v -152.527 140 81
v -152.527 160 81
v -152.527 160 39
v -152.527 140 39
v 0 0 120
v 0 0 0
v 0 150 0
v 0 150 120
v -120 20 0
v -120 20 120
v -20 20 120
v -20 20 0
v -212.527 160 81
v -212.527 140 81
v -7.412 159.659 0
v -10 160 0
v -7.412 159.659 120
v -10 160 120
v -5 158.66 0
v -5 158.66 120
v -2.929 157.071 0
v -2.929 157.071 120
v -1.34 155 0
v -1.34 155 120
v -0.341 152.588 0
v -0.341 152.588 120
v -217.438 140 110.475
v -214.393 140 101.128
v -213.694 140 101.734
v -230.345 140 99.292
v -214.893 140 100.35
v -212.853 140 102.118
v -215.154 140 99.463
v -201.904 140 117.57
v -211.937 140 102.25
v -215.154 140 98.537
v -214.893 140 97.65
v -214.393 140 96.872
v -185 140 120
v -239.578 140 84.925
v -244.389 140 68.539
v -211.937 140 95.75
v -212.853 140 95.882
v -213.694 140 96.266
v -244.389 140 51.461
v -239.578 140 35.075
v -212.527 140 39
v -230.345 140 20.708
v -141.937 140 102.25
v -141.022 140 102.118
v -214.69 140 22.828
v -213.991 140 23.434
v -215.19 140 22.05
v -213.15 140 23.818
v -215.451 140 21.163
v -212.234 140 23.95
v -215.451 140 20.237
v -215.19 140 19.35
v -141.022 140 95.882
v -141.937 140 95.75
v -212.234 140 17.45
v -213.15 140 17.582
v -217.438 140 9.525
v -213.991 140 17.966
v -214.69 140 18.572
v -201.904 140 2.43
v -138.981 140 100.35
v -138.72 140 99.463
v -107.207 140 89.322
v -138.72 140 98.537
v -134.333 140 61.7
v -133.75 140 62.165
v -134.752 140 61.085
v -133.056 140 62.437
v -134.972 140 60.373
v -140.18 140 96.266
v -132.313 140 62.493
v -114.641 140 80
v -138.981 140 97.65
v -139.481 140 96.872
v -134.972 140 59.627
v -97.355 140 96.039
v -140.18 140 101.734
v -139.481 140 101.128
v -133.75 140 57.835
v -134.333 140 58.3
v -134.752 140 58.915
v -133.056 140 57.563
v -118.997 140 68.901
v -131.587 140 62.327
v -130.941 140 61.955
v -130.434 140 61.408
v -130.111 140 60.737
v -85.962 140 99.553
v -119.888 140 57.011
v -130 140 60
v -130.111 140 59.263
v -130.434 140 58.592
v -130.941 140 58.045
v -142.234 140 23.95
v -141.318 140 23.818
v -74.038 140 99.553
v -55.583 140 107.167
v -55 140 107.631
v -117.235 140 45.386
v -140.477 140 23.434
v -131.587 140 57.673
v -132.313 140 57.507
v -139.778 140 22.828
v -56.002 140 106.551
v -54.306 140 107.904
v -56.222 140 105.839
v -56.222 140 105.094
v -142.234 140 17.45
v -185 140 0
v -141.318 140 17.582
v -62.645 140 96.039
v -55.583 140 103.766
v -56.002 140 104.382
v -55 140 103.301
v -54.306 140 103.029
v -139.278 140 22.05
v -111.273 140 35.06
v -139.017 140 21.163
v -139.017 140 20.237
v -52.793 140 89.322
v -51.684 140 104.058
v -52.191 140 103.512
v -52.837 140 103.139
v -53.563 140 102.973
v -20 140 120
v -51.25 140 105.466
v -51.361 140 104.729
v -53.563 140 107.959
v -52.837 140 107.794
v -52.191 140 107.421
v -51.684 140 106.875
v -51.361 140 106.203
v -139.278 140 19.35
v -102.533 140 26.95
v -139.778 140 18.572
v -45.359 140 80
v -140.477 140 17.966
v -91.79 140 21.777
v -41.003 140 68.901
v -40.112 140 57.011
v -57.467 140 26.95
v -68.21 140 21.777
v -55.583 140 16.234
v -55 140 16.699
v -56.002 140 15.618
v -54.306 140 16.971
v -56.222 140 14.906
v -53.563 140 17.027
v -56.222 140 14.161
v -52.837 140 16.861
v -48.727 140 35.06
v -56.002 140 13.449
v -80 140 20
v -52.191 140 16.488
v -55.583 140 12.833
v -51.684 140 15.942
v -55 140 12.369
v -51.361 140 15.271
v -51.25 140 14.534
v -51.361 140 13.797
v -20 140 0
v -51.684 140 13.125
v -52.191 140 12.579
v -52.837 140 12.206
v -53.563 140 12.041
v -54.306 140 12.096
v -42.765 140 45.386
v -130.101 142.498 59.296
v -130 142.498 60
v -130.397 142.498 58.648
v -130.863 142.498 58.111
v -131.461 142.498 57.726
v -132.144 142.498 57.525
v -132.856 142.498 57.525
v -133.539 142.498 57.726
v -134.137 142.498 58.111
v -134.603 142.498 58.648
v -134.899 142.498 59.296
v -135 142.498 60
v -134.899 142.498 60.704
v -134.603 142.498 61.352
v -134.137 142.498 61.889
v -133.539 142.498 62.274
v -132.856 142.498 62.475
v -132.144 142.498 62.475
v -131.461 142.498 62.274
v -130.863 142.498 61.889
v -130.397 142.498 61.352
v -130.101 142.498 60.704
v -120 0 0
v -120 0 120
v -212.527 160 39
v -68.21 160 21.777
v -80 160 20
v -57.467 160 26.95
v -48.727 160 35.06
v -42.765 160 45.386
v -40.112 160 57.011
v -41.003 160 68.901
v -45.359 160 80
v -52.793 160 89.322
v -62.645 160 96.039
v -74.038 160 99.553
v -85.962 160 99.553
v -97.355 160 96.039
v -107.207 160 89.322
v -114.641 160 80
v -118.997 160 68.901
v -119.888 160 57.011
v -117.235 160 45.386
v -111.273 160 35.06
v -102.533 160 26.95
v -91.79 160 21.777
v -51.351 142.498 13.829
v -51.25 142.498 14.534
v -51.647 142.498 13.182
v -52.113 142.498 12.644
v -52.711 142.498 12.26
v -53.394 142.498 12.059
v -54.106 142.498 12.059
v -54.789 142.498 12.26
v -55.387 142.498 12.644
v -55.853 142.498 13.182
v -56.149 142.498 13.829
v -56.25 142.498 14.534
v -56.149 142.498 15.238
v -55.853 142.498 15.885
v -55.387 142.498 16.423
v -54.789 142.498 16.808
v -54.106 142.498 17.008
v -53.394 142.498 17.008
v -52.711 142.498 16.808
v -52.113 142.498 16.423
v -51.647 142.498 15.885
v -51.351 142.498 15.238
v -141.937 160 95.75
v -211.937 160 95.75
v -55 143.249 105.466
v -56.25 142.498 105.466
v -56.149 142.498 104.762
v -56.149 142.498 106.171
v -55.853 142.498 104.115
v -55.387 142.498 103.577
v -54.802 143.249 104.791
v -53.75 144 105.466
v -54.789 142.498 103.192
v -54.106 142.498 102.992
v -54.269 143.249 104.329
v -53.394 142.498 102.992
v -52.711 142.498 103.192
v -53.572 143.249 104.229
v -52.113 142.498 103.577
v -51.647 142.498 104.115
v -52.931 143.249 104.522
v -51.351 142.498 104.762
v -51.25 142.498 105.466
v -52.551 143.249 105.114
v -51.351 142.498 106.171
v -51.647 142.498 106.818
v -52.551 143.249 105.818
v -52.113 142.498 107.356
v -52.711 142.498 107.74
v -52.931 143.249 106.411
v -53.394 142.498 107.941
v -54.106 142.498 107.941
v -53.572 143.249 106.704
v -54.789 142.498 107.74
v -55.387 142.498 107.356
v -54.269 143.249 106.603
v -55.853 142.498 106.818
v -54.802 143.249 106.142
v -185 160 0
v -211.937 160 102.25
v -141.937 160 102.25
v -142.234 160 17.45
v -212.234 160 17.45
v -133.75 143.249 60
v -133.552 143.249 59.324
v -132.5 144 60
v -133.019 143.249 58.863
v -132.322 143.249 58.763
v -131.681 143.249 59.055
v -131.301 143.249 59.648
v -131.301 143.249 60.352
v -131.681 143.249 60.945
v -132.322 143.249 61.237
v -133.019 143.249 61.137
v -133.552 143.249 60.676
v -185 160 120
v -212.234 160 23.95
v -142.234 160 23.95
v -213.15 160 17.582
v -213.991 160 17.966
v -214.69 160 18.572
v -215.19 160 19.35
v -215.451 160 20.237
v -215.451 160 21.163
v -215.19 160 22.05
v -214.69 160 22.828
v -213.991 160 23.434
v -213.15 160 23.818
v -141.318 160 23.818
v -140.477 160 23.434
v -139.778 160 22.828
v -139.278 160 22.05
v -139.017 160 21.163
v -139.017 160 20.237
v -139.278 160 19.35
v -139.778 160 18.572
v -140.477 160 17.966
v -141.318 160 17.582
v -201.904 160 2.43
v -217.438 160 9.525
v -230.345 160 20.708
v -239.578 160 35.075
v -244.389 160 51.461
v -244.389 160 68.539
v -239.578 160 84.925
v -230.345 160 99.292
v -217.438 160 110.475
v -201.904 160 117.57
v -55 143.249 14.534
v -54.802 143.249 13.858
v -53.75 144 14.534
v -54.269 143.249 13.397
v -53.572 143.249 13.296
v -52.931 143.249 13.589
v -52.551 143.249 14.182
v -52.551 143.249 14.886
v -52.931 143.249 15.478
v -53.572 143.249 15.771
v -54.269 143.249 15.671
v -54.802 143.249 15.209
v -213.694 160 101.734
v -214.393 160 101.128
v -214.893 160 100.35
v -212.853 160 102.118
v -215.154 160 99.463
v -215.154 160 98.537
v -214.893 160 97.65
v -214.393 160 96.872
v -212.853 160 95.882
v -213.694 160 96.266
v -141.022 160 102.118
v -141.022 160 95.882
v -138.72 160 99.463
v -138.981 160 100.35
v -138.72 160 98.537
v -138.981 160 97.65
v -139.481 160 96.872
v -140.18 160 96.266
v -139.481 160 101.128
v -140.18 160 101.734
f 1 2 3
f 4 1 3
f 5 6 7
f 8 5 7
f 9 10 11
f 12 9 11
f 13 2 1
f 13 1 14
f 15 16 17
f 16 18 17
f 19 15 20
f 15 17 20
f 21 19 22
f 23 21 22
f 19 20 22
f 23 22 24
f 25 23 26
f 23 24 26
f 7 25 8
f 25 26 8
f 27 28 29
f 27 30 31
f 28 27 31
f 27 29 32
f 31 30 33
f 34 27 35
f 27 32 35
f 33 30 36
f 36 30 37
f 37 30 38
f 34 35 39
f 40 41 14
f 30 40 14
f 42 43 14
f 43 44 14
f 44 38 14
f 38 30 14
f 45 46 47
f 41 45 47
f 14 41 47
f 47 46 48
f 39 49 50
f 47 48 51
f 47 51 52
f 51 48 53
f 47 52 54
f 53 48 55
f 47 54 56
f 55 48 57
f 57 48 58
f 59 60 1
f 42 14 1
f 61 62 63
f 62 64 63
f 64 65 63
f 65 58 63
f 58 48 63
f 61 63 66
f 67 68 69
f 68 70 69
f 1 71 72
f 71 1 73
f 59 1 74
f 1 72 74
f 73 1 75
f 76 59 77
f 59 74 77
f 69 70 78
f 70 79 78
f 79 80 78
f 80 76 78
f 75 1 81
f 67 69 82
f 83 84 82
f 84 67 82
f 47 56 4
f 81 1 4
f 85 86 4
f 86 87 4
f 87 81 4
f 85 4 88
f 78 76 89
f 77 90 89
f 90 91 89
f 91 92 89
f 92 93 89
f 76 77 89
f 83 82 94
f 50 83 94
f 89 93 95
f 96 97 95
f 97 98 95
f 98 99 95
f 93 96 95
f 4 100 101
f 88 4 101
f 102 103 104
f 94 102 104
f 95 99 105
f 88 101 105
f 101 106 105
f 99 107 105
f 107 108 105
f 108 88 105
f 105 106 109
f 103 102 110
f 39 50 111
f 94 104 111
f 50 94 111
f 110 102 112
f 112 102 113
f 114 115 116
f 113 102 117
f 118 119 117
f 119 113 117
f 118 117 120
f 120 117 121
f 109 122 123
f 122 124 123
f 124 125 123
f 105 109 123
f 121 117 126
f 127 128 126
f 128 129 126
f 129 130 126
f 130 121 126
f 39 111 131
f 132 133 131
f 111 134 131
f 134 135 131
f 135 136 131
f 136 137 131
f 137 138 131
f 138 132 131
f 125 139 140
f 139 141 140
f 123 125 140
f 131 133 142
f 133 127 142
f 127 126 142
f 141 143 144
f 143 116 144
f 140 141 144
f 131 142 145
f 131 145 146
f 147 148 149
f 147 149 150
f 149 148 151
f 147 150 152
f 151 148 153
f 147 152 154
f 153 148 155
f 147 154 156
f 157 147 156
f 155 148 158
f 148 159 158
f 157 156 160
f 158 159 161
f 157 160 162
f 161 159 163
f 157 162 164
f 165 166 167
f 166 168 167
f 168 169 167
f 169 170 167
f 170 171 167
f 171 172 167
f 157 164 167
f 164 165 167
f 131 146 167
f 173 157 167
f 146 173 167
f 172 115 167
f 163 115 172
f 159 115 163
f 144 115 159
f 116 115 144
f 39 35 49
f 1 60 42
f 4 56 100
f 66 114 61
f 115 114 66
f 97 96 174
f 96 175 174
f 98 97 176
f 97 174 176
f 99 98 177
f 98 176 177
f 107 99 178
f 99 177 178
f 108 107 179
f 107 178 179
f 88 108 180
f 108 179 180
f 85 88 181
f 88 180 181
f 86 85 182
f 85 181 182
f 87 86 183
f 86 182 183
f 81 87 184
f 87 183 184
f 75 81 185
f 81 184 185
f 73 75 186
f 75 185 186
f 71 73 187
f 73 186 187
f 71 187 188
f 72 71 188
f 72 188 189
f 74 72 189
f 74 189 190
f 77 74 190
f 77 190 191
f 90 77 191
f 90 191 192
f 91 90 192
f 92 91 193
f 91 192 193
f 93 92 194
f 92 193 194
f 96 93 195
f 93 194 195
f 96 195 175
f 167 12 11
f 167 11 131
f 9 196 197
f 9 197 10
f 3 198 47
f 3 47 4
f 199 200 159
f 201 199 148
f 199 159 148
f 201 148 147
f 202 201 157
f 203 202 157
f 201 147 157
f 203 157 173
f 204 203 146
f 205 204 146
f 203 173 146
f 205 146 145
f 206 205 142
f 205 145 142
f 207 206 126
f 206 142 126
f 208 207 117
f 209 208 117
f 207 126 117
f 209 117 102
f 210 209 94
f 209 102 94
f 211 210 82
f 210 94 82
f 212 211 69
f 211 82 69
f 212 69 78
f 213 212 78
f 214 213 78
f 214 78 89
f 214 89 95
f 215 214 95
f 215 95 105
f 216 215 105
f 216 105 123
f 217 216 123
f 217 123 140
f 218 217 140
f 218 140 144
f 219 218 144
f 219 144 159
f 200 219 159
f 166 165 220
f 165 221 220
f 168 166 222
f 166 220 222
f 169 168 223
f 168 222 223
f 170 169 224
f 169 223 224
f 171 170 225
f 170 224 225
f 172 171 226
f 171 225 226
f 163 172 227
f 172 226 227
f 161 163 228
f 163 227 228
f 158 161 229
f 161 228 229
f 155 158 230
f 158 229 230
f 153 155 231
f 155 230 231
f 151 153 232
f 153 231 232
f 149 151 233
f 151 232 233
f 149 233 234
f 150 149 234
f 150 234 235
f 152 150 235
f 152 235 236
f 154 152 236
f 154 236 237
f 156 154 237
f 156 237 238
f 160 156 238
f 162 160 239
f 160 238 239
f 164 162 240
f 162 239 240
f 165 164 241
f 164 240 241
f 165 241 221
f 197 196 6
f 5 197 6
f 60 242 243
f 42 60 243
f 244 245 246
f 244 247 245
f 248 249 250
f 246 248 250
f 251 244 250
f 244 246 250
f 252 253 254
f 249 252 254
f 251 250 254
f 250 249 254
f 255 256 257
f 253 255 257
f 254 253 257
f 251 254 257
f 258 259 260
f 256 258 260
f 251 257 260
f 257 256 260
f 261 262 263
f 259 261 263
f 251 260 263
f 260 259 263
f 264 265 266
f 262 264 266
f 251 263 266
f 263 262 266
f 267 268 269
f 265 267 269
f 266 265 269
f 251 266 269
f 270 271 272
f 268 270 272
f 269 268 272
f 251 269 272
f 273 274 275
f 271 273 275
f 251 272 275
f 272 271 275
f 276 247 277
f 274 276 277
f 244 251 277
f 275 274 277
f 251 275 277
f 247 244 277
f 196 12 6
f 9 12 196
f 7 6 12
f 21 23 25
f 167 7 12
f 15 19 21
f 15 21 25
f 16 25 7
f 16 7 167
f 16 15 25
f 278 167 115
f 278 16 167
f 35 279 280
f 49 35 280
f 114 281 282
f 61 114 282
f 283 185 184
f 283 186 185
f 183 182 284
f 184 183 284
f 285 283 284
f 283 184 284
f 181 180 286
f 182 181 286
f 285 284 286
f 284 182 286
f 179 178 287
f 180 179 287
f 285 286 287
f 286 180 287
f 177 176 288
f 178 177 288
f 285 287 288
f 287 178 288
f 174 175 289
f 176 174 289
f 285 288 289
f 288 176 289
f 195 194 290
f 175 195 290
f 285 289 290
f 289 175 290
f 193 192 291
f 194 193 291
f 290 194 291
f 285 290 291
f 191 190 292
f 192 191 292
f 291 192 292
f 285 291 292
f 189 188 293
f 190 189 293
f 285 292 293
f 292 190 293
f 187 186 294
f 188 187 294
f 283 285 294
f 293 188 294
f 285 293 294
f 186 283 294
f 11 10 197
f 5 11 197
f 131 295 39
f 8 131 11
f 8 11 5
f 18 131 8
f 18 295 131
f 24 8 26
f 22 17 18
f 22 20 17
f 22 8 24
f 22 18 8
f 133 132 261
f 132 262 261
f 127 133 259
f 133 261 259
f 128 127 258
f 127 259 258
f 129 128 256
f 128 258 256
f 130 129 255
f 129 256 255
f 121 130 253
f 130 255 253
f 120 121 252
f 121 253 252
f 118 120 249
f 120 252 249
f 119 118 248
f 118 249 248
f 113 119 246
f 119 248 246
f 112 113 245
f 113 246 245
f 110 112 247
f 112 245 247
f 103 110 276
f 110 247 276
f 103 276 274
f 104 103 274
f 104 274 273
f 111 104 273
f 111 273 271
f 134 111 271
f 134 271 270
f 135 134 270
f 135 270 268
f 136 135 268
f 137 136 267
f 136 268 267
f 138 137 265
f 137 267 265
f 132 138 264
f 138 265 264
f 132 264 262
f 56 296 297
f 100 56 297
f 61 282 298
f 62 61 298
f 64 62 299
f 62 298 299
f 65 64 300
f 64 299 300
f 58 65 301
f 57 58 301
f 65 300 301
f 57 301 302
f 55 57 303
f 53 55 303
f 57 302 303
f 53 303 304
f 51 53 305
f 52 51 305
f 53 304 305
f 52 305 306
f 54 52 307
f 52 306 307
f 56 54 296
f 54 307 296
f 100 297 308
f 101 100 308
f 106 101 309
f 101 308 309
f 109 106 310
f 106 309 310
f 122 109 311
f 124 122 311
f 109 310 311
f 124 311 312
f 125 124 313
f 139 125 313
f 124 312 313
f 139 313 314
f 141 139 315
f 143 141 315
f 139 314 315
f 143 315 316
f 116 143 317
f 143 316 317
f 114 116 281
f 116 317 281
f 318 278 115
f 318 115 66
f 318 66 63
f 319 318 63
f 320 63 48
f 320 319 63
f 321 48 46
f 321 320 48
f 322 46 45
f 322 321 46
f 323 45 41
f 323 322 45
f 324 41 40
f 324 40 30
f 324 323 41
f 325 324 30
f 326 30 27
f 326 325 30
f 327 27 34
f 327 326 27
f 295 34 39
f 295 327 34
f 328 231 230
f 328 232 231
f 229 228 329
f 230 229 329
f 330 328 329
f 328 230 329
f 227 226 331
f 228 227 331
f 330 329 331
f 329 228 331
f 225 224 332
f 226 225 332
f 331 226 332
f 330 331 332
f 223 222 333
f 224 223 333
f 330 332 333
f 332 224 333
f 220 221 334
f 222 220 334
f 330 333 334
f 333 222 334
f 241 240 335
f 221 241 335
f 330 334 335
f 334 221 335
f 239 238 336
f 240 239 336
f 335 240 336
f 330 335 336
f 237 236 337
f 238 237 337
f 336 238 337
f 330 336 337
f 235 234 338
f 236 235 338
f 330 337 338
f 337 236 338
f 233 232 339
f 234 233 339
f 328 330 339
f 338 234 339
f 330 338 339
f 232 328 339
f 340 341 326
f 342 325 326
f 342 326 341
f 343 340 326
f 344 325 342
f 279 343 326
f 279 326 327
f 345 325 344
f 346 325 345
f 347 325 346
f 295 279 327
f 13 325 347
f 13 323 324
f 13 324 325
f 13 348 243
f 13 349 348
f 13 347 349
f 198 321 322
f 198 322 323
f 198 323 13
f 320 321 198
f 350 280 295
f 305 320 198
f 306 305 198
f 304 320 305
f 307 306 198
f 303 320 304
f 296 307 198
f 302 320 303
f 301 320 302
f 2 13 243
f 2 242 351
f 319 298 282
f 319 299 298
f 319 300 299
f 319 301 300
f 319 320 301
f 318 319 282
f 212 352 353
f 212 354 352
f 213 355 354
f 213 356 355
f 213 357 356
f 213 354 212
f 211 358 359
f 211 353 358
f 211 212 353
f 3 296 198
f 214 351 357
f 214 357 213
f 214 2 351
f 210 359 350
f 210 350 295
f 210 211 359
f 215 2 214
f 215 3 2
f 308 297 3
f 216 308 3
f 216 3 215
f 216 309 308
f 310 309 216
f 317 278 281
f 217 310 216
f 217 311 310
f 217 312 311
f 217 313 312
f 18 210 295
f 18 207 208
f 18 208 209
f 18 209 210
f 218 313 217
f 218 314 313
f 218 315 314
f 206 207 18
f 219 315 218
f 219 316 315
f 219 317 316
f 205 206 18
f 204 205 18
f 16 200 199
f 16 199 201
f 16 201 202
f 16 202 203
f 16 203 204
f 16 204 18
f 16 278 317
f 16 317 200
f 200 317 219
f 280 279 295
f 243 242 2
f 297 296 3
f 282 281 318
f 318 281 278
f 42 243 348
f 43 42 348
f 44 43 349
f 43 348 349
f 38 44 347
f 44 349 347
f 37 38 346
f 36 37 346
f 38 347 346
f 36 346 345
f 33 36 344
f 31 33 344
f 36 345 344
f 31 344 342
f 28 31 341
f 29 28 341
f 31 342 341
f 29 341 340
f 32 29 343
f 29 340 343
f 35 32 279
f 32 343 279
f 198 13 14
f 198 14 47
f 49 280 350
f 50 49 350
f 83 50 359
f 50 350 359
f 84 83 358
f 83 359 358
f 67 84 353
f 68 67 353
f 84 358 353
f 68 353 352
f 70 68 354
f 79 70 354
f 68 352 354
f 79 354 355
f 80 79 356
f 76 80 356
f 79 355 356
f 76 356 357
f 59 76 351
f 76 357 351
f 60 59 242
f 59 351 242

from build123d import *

# Parameters (mm, degrees)
SKETCH4_W                    = 20
SKETCH4_H                    = 120
SKETCH4_W_2                  = 120
SKETCH4_H_2                  = 20
SKETCH4_W_3                  = 160
BOSS_EXTRUDE3_DEPTH          = 120
BOSS_EXTRUDE4_DEPTH          = 20
SKETCH21_R                   = 40
CUT_EXTRUDE3_DEPTH           = 25
SKETCH24_W                   = 15
SKETCH24_H                   = 20
SPLIT1_START                 = 97.450277265
SPLIT1_OUTLINE_R             = 45
SPLIT1_OUTLINE_R_2           = 25.75
SPLIT1_DEPTH                 = 42.549722735
SPLIT1_2_DEPTH               = 42.549722735
SPLIT1_3_OUTLINE_R           = 25.75
SPLIT1_3_DEPTH               = 6
SPLIT1_START_2               = 103.450277265
SPLIT1_4_DEPTH               = 8.549722735
SPLIT1_START_3               = 132
SPLIT1_5_DEPTH               = 8
F_5_0_5_DIAMETER_HOLE1_D     = 5
F_5_0_5_DIAMETER_HOLE1_DEPTH = 2.497848452
F_5_0_5_DIAMETER_HOLE1_TIP   = 1.502151548
CUT_EXTRUDE4_DEPTH           = 317.267292017
CUT_EXTRUDE5_DEPTH           = 307.634962129
CUT_EXTRUDE5_DEPTH_BACK      = 307.634962129
FILLET1_R                    = 10


# Read off the part's stored shape, not the designer's step: Split1
with BuildPart() as part:
    # Sketch4 → Boss-Extrude3 (new body)
    with BuildSketch(Plane.XY):
        with Locations((-10, 80)):
            Rectangle(SKETCH4_W, SKETCH4_H)
        with Locations((-60, 10)):
            Rectangle(SKETCH4_W_2, SKETCH4_H_2)
        with Locations((-80, 150)):
            Rectangle(SKETCH4_W_3, SKETCH4_H_2)
    extrude(amount=BOSS_EXTRUDE3_DEPTH)

    # Sketch20 → Boss-Extrude4 (add)
    with BuildSketch(Plane(origin=(0, 160, 0), x_dir=(1, 0, 0), z_dir=(0, 1, 0))):
        with BuildLine():
            Line((-185, -120), (-160, -120))
            Line((-160, -120), (-160, 0))
            Line((-160, 0), (-185, 0))
            ThreePointArc((-185, 0), (-245, -60), (-185, -120))
        make_face()
    extrude(amount=-BOSS_EXTRUDE4_DEPTH)

    # Sketch21 → Cut-Extrude3 (cut)
    with BuildSketch(Plane.XZ.offset(-140)):
        with Locations(Location((-80, 60, 0), (0, 0, 270))):
            Circle(SKETCH21_R)
    extrude(amount=-CUT_EXTRUDE3_DEPTH, mode=Mode.SUBTRACT)

    # Sketch23 → Revolve1 (revolve)
    with BuildSketch(Plane(origin=(0, 0, 60), x_dir=(-1, 0, 0), z_dir=(0, 0, -1)), mode=Mode.PRIVATE) as revolve1_sk:
        Polygon((125, 140), (120, 140), (120, 103.450277265), (105.75, 103.450277265), (105.75, 97.450277265), (125, 97.450277265), align=None)
    revolve(revolve1_sk.sketch.rotate(Axis((-80, 160, 60), (0, -1, 0)), 270), axis=Axis((-80, 160, 60), (0, -1, 0)))

    # Cut-Sweep1: sweep along a path in Sketch25
    with BuildLine(Plane(origin=(0, 132, 0), x_dir=(-1, 0, 0), z_dir=(0, -1, 0))) as cut_sweep1_path:
        Line((125, -80.343984431), (80, -90))
        ThreePointArc((80, -90), (50, -60), (80, -30))
        Line((80, -30), (125, -39.656015569))
    # Sketch24 → Cut-Sweep1 (sweep, cut)
    with BuildSketch(Plane.ZY.offset(125)):
        with Locations((37.5, 122)):
            Rectangle(SKETCH24_W, SKETCH24_H)
    sweep(path=cut_sweep1_path.line, transition=Transition.RIGHT, mode=Mode.SUBTRACT)

    # Split1 outline → Split1 (cut)
    with BuildSketch(Plane(origin=(0, 0, 0), x_dir=(1, 0, 0), z_dir=(0, 1, 0)).offset(SPLIT1_START)):
        with Locations((-80, -60)):
            Circle(SPLIT1_OUTLINE_R)
        with Locations((-80, -60)):
            Circle(SPLIT1_OUTLINE_R_2, mode=Mode.SUBTRACT)
    extrude(amount=SPLIT1_DEPTH, mode=Mode.SUBTRACT)

    # Ø5.0 (5) Diameter Hole1
    with Locations(Plane(origin=(0, 140, 0), x_dir=(-1, 0, 0), z_dir=(0, -1, 0))):
        with Locations((53.75, -14.533666301), (132.5, -60), (53.75, -105.466333699)):
            Hole(F_5_0_5_DIAMETER_HOLE1_D / 2, depth=F_5_0_5_DIAMETER_HOLE1_DEPTH)
            with Locations((0, 0, -(F_5_0_5_DIAMETER_HOLE1_DEPTH + F_5_0_5_DIAMETER_HOLE1_TIP / 2))):  # 118° drill point
                Cone(0, F_5_0_5_DIAMETER_HOLE1_D / 2, F_5_0_5_DIAMETER_HOLE1_TIP, mode=Mode.SUBTRACT)

    # Sketch19 → Cut-Extrude4 (cut, through all)
    with BuildSketch(Plane(origin=(0, 160, 0), x_dir=(1, 0, 0), z_dir=(0, 1, 0))):
        Polygon((-152.526760948, -69.999980109), (-152.526760948, -81), (-212.526760948, -81), (-212.526760948, -39), (-152.526760948, -39), (-152.526760948, -50.000019891), align=None)
    extrude(amount=-CUT_EXTRUDE4_DEPTH, mode=Mode.SUBTRACT)

    # Sketch30 → Cut-Extrude5 (cut, two sides: drawn at the far end of the back side and taken through both)
    with BuildSketch(Plane.XZ.offset(-140).offset(-CUT_EXTRUDE5_DEPTH_BACK)):
        with BuildLine():
            Line((-212.234124069, 23.95), (-142.234124069, 23.95))
            ThreePointArc((-142.234124069, 23.95), (-138.984124069, 20.7), (-142.234124069, 17.45))
            Line((-142.234124069, 17.45), (-212.234124069, 17.45))
            ThreePointArc((-212.234124069, 17.45), (-215.484124069, 20.7), (-212.234124069, 23.95))
        make_face()
        with BuildLine():
            Line((-211.937175822, 102.25), (-141.937175822, 102.25))
            ThreePointArc((-141.937175822, 102.25), (-138.687175822, 99), (-141.937175822, 95.75))
            Line((-141.937175822, 95.75), (-211.937175822, 95.75))
            ThreePointArc((-211.937175822, 95.75), (-215.187175822, 99), (-211.937175822, 102.25))
        make_face()
    extrude(amount=CUT_EXTRUDE5_DEPTH + CUT_EXTRUDE5_DEPTH_BACK, mode=Mode.SUBTRACT)

    # Fillet1
    fillet1_edges = [part.edges().sort_by_distance(p)[0] for p in [
        (0, 160, 60),
    ]]
    fillet(fillet1_edges, radius=FILLET1_R)


with BuildPart() as body_2:
    # Split1 2 outline → Split1 2 (new body)
    with BuildSketch(Plane(origin=(0, 0, 0), x_dir=(1, 0, 0), z_dir=(0, 1, 0)).offset(SPLIT1_START)):
        with BuildLine():
            ThreePointArc((-97.74561888, -24.151806035), (-40, -60), (-97.74561888, -95.848193965))
            Line((-97.74561888, -95.848193965), (-110.465485891, -93.118788767))
            ThreePointArc((-110.465485891, -93.118788767), (-35, -60), (-110.465485891, -26.881211233))
            Line((-110.465485891, -26.881211233), (-97.74561888, -24.151806035))
        make_face()
        with BuildLine():
            ThreePointArc((-116.266630075, -76.873990133), (-120, -60), (-116.266630075, -43.126009867))
            Line((-116.266630075, -43.126009867), (-122.209965285, -44.401319586))
            ThreePointArc((-122.209965285, -44.401319586), (-125, -60), (-122.209965285, -75.598680414))
            Line((-122.209965285, -75.598680414), (-116.266630075, -76.873990133))
        make_face()
    extrude(amount=SPLIT1_2_DEPTH)

    # Split1 3 outline → Split1 3 (add)
    with BuildSketch(Plane(origin=(0, 0, 0), x_dir=(1, 0, 0), z_dir=(0, 1, 0)).offset(SPLIT1_START)):
        with BuildLine():
            ThreePointArc((-97.74561888, -95.848193965), (-40, -60), (-97.74561888, -24.151806035))
            Line((-97.74561888, -24.151806035), (-110.465485891, -26.881211233))
            ThreePointArc((-110.465485891, -26.881211233), (-117.378721889, -34.94344098), (-122.209965285, -44.401319586))
            Line((-122.209965285, -44.401319586), (-116.266630075, -43.126009867))
            ThreePointArc((-116.266630075, -43.126009867), (-120, -60), (-116.266630075, -76.873990133))
            Line((-116.266630075, -76.873990133), (-122.209965285, -75.598680414))
            ThreePointArc((-122.209965285, -75.598680414), (-117.378721889, -85.05655902), (-110.465485891, -93.118788767))
            Line((-110.465485891, -93.118788767), (-97.74561888, -95.848193965))
        make_face()
        with Locations((-80, -60)):
            Circle(SPLIT1_3_OUTLINE_R, mode=Mode.SUBTRACT)
    extrude(amount=SPLIT1_3_DEPTH)

    # Split1 4 outline → Split1 4 (add)
    with BuildSketch(Plane(origin=(0, 0, 0), x_dir=(1, 0, 0), z_dir=(0, 1, 0)).offset(SPLIT1_START_2)):
        with BuildLine():
            ThreePointArc((-116.266630075, -43.126009867), (-108.624043426, -32.059632466), (-97.74561888, -24.151806035))
            Line((-97.74561888, -24.151806035), (-110.465485891, -26.881211233))
            ThreePointArc((-110.465485891, -26.881211233), (-117.378721889, -34.94344098), (-122.209965285, -44.401319586))
            Line((-122.209965285, -44.401319586), (-116.266630075, -43.126009867))
        make_face()
        with BuildLine():
            Line((-110.465485891, -93.118788767), (-97.74561888, -95.848193965))
            ThreePointArc((-97.74561888, -95.848193965), (-108.624043426, -87.940367534), (-116.266630075, -76.873990133))
            Line((-116.266630075, -76.873990133), (-122.209965285, -75.598680414))
            ThreePointArc((-122.209965285, -75.598680414), (-117.378721889, -85.05655902), (-110.465485891, -93.118788767))
        make_face()
    extrude(amount=SPLIT1_4_DEPTH)

    # Split1 5 outline → Split1 5 (add)
    with BuildSketch(Plane(origin=(0, 0, 0), x_dir=(1, 0, 0), z_dir=(0, 1, 0)).offset(SPLIT1_START_3)):
        with BuildLine():
            ThreePointArc((-116.266630075, -43.126009867), (-108.624043426, -32.059632466), (-97.74561888, -24.151806035))
            Line((-97.74561888, -24.151806035), (-110.465485891, -26.881211233))
            ThreePointArc((-110.465485891, -26.881211233), (-117.378721889, -34.94344098), (-122.209965285, -44.401319586))
            Line((-122.209965285, -44.401319586), (-116.266630075, -43.126009867))
        make_face()
        with BuildLine():
            Line((-110.465485891, -93.118788767), (-97.74561888, -95.848193965))
            ThreePointArc((-97.74561888, -95.848193965), (-108.624043426, -87.940367534), (-116.266630075, -76.873990133))
            Line((-116.266630075, -76.873990133), (-122.209965285, -75.598680414))
            ThreePointArc((-122.209965285, -75.598680414), (-117.378721889, -85.05655902), (-110.465485891, -93.118788767))
        make_face()
    extrude(amount=SPLIT1_5_DEPTH)


solid = part.part
